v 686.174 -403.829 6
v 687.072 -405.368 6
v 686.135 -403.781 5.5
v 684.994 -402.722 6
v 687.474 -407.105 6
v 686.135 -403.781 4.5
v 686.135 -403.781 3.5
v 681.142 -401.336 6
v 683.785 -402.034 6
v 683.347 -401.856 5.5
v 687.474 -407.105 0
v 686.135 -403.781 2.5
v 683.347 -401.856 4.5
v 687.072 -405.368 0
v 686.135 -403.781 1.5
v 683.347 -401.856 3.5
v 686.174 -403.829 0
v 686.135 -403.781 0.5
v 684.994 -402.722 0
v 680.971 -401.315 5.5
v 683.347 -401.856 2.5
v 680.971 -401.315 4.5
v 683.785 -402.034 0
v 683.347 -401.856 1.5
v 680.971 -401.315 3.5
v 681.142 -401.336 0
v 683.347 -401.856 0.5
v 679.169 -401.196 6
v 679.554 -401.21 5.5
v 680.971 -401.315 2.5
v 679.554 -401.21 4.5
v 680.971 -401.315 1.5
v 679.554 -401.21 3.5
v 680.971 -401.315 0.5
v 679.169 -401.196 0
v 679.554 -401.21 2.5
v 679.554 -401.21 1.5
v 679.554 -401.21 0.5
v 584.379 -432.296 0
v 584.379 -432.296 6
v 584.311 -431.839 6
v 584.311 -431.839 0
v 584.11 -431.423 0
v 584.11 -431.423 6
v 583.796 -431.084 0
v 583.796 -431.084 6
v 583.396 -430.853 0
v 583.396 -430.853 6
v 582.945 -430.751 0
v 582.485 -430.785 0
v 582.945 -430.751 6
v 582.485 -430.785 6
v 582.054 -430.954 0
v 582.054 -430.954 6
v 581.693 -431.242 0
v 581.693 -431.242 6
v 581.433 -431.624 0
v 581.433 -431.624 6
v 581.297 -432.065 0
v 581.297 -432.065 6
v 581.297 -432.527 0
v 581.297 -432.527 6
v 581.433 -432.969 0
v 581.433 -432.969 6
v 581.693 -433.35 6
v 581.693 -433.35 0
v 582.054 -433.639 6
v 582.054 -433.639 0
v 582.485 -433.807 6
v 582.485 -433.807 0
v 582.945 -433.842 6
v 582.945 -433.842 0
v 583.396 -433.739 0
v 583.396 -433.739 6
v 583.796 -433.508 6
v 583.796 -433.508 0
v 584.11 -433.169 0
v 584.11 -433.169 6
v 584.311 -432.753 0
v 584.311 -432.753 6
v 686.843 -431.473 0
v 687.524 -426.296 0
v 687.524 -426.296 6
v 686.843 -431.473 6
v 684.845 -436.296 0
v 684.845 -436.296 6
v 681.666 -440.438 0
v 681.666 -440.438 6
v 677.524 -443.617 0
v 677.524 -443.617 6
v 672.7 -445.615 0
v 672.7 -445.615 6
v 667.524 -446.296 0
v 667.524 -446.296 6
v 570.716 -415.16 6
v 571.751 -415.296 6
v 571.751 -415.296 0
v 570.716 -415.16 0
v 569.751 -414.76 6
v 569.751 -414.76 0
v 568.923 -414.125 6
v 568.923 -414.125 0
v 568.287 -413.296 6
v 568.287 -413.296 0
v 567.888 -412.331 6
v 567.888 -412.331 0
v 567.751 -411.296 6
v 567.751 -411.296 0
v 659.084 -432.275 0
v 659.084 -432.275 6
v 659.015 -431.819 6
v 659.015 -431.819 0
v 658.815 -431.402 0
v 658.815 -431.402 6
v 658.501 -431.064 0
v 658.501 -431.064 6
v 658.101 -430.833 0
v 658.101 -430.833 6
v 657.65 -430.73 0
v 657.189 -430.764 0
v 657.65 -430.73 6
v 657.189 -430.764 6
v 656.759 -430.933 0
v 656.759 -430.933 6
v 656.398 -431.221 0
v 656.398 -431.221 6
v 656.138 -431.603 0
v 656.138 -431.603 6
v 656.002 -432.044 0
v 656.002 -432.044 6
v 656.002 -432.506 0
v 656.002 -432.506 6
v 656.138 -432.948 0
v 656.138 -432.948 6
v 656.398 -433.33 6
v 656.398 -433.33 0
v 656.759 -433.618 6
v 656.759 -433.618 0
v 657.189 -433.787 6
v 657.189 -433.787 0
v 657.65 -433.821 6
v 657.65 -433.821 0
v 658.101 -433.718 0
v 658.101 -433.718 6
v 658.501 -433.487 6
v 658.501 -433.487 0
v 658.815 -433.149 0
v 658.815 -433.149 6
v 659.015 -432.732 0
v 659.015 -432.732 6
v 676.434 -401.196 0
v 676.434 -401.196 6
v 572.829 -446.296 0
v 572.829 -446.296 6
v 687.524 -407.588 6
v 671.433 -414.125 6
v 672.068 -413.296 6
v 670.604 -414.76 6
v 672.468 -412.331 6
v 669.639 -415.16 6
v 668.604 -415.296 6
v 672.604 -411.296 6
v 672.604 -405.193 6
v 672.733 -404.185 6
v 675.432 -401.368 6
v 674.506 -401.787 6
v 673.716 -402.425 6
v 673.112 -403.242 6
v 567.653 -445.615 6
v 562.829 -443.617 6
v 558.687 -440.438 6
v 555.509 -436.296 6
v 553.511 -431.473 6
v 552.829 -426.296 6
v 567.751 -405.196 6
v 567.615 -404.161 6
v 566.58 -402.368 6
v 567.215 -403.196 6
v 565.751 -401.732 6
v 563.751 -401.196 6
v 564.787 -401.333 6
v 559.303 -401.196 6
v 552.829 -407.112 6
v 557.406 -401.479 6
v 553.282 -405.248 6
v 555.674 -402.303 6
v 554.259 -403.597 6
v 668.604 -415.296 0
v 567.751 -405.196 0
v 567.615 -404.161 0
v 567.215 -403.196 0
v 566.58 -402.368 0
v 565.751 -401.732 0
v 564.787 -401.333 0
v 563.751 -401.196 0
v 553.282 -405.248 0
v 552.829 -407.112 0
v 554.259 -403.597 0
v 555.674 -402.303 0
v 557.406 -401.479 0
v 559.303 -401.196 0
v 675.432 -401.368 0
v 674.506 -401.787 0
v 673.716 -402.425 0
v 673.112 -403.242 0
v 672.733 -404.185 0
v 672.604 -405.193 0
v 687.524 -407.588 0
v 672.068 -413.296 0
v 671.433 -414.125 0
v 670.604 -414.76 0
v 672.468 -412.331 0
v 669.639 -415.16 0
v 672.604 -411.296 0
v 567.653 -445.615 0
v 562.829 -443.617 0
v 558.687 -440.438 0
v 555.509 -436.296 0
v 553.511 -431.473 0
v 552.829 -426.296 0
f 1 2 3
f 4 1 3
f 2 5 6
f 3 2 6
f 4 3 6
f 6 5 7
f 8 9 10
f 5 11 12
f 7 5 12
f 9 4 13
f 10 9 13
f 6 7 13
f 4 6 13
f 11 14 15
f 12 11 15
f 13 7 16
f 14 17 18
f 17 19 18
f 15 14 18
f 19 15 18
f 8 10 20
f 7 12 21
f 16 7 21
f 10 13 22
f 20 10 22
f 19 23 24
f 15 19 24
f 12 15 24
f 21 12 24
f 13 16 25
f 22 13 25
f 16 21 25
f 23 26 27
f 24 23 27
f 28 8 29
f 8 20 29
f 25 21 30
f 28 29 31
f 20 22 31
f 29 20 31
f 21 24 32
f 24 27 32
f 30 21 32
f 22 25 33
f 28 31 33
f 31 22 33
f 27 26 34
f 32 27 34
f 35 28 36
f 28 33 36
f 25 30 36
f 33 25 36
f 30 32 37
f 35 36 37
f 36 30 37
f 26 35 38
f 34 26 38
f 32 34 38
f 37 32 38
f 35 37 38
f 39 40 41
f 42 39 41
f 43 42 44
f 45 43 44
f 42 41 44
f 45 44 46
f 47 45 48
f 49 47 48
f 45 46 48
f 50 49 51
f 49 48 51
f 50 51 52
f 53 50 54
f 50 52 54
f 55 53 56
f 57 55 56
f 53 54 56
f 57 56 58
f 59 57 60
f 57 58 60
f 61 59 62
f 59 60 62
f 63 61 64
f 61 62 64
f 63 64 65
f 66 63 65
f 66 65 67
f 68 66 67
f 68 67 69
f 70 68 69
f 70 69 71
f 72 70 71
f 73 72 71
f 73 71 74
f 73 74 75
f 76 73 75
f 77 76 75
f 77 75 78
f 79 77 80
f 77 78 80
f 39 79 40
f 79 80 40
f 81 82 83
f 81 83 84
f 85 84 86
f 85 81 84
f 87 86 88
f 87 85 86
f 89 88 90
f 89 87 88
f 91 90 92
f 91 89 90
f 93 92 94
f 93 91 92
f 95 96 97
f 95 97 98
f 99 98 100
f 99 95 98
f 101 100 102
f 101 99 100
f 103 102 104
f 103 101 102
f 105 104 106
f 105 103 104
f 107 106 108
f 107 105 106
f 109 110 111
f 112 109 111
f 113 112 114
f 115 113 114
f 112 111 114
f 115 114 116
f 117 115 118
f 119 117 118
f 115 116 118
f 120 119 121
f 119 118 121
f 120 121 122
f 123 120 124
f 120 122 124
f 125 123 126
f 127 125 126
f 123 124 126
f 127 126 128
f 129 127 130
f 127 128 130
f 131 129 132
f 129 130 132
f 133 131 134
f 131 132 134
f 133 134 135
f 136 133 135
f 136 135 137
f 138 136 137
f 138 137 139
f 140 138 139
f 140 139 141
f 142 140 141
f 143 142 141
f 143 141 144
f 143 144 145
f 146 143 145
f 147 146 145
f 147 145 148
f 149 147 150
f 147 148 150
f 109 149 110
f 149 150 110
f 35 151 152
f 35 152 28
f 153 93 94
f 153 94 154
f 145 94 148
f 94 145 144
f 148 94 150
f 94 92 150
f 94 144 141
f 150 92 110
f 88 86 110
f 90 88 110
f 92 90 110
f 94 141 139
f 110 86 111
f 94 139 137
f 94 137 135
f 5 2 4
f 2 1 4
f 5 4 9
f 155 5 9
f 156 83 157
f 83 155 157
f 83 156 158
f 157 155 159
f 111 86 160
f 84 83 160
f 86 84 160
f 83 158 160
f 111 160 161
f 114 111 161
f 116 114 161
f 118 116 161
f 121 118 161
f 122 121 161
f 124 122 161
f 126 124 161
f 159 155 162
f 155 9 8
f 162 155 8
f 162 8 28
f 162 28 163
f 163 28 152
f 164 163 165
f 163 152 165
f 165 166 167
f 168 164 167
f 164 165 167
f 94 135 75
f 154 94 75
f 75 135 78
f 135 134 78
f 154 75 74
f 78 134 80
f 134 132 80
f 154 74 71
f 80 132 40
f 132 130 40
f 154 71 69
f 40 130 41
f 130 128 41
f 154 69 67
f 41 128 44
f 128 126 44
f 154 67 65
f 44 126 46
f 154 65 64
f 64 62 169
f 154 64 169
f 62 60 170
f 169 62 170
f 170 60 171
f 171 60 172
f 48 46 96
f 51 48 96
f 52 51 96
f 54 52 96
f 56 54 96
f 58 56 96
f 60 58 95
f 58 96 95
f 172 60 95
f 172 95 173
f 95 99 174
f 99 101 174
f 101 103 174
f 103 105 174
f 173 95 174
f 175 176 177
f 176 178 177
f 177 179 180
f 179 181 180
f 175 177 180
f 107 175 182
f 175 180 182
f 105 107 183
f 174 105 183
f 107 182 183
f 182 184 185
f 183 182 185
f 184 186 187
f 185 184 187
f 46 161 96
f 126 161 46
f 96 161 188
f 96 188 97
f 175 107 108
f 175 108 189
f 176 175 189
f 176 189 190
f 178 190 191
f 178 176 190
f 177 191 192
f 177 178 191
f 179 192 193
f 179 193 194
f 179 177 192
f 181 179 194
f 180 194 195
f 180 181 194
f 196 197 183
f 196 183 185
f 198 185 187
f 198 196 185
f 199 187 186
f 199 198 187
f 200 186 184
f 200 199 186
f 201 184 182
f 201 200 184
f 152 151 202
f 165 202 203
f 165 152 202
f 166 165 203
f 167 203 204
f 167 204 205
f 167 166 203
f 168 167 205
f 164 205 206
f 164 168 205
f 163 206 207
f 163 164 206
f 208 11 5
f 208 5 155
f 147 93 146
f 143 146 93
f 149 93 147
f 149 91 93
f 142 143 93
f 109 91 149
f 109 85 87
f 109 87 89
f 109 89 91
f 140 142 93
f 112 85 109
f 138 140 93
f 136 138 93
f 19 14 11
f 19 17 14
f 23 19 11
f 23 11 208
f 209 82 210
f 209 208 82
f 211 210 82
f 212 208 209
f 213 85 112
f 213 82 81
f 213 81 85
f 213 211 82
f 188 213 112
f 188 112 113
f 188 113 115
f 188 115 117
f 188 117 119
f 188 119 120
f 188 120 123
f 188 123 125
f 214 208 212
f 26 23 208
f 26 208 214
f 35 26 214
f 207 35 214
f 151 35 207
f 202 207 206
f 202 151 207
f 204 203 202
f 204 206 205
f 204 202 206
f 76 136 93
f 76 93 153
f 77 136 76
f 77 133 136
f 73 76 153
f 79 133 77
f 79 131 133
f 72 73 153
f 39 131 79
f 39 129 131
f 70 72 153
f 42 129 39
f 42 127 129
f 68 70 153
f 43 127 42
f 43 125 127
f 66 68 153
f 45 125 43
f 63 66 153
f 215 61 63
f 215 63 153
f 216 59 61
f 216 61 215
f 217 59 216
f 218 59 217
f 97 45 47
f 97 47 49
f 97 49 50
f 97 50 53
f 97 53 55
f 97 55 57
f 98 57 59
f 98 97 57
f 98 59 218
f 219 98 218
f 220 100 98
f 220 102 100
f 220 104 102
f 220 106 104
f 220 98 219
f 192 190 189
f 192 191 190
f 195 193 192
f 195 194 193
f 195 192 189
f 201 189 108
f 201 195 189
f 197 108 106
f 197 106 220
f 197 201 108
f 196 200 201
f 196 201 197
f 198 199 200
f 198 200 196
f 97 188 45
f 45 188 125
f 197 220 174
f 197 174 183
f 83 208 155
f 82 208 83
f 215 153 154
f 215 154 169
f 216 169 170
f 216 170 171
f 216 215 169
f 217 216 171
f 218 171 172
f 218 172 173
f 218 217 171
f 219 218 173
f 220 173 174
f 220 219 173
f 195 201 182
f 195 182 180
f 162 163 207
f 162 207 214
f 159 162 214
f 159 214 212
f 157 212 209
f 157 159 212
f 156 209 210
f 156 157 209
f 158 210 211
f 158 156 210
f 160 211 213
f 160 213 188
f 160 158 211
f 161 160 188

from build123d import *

# Parameters (mm, degrees)
DODANIE_WYCI_GNI_CIE1_DEPTH = 6
SZKIC5_R                    = 1.55
WYTNIJ_WYCI_GNI_CIE4_DEPTH  = 6
WYTNIJ_WYCI_GNI_CIE3_DEPTH  = 10
WYTNIJ_WYCI_GNI_CIE5_DEPTH  = 6


with BuildPart() as part:
    # Szkic1 → Dodanie-wyciągnięcie1 (new body)
    with BuildSketch(Plane.XY):
        with BuildLine():
            Line((559.30310538, -401.196233577), (679.169206808, -401.196233577))
            add(Edge.make_bspline(
                [(687.47449185, -407.105172623), (687.460895427, -406.945083018), (687.399523084, -406.440112421), (687.106391165, -405.247306424), (686.199030087, -403.66784482), (684.728358654, -402.453584158), (683.321816891, -401.804200876), (682.065878557, -401.467025134), (680.947934354, -401.299453727), (680.131685922, -401.236634896), (679.578376244, -401.210432629), (679.339173948, -401.201842063), (679.210839256, -401.19761192), (679.187499025, -401.196838314), (679.169206808, -401.196233577)],
                knots=[0.021401383, 0.021401383, 0.021401383, 0.021401383, 0.051544166, 0.115122874, 0.24228029, 0.369437707, 0.496595123, 0.62375254, 0.750909956, 0.878067373, 0.941646081, 0.990181611, 0.996198883, 1.005224789, 1.005224789, 1.005224789, 1.005224789], degree=3))
            Line((687.47449185, -407.105172623), (687.524116, -407.588097358))
            Line((687.524116, -407.588097358), (687.524116, -419.296173359))
            Line((687.524116, -419.296173359), (687.524116, -426.296170097))
            ThreePointArc((687.524116, -426.296170097), (681.666251932, -440.438306105), (667.524116585, -446.296171768))
            Line((667.524116585, -446.296171768), (572.829457094, -446.296179681))
            ThreePointArc((572.829457094, -446.296179681), (558.687321683, -440.438316102), (552.829456509, -426.296181352))
            Line((552.829456509, -426.296181352), (552.829456509, -407.696232795))
            Line((552.829456509, -407.696232795), (552.829456509, -407.111536822))
            ThreePointArc((552.829456509, -407.111536822), (554.918503283, -402.897768775), (559.30310538, -401.196233577))
        make_face()
    extrude(amount=DODANIE_WYCI_GNI_CIE1_DEPTH)

    # Szkic5 → Wytnij-wyciągnięcie4 (cut)
    with BuildSketch(Plane.XY.offset(6)):
        with Locations((582.829456509, -432.296173588)):
            Circle(SZKIC5_R)
        with Locations((657.534304884, -432.275447832)):
            Circle(SZKIC5_R)
    extrude(amount=-WYTNIJ_WYCI_GNI_CIE4_DEPTH, mode=Mode.SUBTRACT)

    # Szkic4 → Wytnij-wyciągnięcie3 (cut)
    with BuildSketch(Plane.XY.offset(6)):
        with BuildLine():
            Line((598.90310538, -405.068549386), (592.90310538, -405.068549386))
            ThreePointArc((592.90310538, -405.068549386), (590.428231646, -406.093675652), (589.40310538, -408.568549386))
            Line((589.40310538, -408.568549386), (589.40310538, -409.168549386))
            ThreePointArc((589.40310538, -409.168549386), (590.428231646, -411.64342312), (592.90310538, -412.668549386))
            Line((592.90310538, -412.668549386), (598.90310538, -412.668549386))
            ThreePointArc((598.90310538, -412.668549386), (601.377979114, -411.64342312), (602.40310538, -409.168549386))
            Line((602.40310538, -409.168549386), (602.40310538, -408.568549386))
            ThreePointArc((602.40310538, -408.568549386), (601.377979114, -406.093675652), (598.90310538, -405.068549386))
        make_face()
    extrude(amount=-WYTNIJ_WYCI_GNI_CIE3_DEPTH, mode=Mode.SUBTRACT)

    # Szkic7 → Wytnij-wyciągnięcie5 (cut)
    with BuildSketch(Plane.XY.offset(6)):
        with BuildLine():
            Line((668.604116, -415.296173181), (571.751345179, -415.296173181))
            ThreePointArc((571.751345179, -415.296173181), (568.922918055, -414.124600305), (567.751345179, -411.296173181))
            Line((567.751345179, -411.296173181), (567.751345179, -405.196233577))
            ThreePointArc((567.751345179, -405.196233577), (566.579772304, -402.367806452), (563.751345179, -401.196233577))
            Line((563.751345179, -401.196233577), (676.593615823, -401.192611842))
            ThreePointArc((676.593615823, -401.192611842), (673.771978935, -402.367885748), (672.604116, -405.19259806))
            Line((672.604116, -405.19259806), (672.604116, -411.296173181))
            ThreePointArc((672.604116, -411.296173181), (671.432543125, -414.124600305), (668.604116, -415.296173181))
        make_face()
    extrude(amount=-WYTNIJ_WYCI_GNI_CIE5_DEPTH, mode=Mode.SUBTRACT)


solid = part.part
